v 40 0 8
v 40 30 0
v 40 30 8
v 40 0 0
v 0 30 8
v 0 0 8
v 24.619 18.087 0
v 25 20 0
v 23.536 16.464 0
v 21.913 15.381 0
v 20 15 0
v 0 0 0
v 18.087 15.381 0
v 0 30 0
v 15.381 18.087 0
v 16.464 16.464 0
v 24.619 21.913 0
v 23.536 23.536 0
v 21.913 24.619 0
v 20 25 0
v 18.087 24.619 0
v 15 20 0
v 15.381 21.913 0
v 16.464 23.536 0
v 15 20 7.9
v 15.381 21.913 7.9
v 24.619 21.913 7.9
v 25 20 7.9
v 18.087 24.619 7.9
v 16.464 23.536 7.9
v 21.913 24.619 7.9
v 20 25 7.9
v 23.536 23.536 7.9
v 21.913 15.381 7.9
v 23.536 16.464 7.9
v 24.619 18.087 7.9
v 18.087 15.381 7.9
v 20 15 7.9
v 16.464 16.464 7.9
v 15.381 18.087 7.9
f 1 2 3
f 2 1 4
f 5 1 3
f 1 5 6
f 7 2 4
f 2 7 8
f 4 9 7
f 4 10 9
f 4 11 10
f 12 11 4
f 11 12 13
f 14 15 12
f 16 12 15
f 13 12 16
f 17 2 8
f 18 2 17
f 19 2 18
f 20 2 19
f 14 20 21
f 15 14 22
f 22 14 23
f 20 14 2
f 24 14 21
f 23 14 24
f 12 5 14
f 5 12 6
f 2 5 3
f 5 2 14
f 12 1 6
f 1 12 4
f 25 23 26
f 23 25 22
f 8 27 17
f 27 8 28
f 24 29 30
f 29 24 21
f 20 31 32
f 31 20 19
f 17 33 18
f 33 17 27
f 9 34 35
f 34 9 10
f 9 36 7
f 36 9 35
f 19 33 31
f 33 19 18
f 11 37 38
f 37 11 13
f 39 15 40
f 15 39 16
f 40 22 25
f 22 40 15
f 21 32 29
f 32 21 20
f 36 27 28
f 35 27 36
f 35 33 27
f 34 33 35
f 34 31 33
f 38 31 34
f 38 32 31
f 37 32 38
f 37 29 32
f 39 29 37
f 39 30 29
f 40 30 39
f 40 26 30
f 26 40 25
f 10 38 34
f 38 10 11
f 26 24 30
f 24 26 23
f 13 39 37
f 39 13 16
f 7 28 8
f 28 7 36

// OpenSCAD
difference() {
  cube([40, 30, 8]);
  translate([20, 20, -0.1])
    cylinder(h = 8, r = 5);
}
